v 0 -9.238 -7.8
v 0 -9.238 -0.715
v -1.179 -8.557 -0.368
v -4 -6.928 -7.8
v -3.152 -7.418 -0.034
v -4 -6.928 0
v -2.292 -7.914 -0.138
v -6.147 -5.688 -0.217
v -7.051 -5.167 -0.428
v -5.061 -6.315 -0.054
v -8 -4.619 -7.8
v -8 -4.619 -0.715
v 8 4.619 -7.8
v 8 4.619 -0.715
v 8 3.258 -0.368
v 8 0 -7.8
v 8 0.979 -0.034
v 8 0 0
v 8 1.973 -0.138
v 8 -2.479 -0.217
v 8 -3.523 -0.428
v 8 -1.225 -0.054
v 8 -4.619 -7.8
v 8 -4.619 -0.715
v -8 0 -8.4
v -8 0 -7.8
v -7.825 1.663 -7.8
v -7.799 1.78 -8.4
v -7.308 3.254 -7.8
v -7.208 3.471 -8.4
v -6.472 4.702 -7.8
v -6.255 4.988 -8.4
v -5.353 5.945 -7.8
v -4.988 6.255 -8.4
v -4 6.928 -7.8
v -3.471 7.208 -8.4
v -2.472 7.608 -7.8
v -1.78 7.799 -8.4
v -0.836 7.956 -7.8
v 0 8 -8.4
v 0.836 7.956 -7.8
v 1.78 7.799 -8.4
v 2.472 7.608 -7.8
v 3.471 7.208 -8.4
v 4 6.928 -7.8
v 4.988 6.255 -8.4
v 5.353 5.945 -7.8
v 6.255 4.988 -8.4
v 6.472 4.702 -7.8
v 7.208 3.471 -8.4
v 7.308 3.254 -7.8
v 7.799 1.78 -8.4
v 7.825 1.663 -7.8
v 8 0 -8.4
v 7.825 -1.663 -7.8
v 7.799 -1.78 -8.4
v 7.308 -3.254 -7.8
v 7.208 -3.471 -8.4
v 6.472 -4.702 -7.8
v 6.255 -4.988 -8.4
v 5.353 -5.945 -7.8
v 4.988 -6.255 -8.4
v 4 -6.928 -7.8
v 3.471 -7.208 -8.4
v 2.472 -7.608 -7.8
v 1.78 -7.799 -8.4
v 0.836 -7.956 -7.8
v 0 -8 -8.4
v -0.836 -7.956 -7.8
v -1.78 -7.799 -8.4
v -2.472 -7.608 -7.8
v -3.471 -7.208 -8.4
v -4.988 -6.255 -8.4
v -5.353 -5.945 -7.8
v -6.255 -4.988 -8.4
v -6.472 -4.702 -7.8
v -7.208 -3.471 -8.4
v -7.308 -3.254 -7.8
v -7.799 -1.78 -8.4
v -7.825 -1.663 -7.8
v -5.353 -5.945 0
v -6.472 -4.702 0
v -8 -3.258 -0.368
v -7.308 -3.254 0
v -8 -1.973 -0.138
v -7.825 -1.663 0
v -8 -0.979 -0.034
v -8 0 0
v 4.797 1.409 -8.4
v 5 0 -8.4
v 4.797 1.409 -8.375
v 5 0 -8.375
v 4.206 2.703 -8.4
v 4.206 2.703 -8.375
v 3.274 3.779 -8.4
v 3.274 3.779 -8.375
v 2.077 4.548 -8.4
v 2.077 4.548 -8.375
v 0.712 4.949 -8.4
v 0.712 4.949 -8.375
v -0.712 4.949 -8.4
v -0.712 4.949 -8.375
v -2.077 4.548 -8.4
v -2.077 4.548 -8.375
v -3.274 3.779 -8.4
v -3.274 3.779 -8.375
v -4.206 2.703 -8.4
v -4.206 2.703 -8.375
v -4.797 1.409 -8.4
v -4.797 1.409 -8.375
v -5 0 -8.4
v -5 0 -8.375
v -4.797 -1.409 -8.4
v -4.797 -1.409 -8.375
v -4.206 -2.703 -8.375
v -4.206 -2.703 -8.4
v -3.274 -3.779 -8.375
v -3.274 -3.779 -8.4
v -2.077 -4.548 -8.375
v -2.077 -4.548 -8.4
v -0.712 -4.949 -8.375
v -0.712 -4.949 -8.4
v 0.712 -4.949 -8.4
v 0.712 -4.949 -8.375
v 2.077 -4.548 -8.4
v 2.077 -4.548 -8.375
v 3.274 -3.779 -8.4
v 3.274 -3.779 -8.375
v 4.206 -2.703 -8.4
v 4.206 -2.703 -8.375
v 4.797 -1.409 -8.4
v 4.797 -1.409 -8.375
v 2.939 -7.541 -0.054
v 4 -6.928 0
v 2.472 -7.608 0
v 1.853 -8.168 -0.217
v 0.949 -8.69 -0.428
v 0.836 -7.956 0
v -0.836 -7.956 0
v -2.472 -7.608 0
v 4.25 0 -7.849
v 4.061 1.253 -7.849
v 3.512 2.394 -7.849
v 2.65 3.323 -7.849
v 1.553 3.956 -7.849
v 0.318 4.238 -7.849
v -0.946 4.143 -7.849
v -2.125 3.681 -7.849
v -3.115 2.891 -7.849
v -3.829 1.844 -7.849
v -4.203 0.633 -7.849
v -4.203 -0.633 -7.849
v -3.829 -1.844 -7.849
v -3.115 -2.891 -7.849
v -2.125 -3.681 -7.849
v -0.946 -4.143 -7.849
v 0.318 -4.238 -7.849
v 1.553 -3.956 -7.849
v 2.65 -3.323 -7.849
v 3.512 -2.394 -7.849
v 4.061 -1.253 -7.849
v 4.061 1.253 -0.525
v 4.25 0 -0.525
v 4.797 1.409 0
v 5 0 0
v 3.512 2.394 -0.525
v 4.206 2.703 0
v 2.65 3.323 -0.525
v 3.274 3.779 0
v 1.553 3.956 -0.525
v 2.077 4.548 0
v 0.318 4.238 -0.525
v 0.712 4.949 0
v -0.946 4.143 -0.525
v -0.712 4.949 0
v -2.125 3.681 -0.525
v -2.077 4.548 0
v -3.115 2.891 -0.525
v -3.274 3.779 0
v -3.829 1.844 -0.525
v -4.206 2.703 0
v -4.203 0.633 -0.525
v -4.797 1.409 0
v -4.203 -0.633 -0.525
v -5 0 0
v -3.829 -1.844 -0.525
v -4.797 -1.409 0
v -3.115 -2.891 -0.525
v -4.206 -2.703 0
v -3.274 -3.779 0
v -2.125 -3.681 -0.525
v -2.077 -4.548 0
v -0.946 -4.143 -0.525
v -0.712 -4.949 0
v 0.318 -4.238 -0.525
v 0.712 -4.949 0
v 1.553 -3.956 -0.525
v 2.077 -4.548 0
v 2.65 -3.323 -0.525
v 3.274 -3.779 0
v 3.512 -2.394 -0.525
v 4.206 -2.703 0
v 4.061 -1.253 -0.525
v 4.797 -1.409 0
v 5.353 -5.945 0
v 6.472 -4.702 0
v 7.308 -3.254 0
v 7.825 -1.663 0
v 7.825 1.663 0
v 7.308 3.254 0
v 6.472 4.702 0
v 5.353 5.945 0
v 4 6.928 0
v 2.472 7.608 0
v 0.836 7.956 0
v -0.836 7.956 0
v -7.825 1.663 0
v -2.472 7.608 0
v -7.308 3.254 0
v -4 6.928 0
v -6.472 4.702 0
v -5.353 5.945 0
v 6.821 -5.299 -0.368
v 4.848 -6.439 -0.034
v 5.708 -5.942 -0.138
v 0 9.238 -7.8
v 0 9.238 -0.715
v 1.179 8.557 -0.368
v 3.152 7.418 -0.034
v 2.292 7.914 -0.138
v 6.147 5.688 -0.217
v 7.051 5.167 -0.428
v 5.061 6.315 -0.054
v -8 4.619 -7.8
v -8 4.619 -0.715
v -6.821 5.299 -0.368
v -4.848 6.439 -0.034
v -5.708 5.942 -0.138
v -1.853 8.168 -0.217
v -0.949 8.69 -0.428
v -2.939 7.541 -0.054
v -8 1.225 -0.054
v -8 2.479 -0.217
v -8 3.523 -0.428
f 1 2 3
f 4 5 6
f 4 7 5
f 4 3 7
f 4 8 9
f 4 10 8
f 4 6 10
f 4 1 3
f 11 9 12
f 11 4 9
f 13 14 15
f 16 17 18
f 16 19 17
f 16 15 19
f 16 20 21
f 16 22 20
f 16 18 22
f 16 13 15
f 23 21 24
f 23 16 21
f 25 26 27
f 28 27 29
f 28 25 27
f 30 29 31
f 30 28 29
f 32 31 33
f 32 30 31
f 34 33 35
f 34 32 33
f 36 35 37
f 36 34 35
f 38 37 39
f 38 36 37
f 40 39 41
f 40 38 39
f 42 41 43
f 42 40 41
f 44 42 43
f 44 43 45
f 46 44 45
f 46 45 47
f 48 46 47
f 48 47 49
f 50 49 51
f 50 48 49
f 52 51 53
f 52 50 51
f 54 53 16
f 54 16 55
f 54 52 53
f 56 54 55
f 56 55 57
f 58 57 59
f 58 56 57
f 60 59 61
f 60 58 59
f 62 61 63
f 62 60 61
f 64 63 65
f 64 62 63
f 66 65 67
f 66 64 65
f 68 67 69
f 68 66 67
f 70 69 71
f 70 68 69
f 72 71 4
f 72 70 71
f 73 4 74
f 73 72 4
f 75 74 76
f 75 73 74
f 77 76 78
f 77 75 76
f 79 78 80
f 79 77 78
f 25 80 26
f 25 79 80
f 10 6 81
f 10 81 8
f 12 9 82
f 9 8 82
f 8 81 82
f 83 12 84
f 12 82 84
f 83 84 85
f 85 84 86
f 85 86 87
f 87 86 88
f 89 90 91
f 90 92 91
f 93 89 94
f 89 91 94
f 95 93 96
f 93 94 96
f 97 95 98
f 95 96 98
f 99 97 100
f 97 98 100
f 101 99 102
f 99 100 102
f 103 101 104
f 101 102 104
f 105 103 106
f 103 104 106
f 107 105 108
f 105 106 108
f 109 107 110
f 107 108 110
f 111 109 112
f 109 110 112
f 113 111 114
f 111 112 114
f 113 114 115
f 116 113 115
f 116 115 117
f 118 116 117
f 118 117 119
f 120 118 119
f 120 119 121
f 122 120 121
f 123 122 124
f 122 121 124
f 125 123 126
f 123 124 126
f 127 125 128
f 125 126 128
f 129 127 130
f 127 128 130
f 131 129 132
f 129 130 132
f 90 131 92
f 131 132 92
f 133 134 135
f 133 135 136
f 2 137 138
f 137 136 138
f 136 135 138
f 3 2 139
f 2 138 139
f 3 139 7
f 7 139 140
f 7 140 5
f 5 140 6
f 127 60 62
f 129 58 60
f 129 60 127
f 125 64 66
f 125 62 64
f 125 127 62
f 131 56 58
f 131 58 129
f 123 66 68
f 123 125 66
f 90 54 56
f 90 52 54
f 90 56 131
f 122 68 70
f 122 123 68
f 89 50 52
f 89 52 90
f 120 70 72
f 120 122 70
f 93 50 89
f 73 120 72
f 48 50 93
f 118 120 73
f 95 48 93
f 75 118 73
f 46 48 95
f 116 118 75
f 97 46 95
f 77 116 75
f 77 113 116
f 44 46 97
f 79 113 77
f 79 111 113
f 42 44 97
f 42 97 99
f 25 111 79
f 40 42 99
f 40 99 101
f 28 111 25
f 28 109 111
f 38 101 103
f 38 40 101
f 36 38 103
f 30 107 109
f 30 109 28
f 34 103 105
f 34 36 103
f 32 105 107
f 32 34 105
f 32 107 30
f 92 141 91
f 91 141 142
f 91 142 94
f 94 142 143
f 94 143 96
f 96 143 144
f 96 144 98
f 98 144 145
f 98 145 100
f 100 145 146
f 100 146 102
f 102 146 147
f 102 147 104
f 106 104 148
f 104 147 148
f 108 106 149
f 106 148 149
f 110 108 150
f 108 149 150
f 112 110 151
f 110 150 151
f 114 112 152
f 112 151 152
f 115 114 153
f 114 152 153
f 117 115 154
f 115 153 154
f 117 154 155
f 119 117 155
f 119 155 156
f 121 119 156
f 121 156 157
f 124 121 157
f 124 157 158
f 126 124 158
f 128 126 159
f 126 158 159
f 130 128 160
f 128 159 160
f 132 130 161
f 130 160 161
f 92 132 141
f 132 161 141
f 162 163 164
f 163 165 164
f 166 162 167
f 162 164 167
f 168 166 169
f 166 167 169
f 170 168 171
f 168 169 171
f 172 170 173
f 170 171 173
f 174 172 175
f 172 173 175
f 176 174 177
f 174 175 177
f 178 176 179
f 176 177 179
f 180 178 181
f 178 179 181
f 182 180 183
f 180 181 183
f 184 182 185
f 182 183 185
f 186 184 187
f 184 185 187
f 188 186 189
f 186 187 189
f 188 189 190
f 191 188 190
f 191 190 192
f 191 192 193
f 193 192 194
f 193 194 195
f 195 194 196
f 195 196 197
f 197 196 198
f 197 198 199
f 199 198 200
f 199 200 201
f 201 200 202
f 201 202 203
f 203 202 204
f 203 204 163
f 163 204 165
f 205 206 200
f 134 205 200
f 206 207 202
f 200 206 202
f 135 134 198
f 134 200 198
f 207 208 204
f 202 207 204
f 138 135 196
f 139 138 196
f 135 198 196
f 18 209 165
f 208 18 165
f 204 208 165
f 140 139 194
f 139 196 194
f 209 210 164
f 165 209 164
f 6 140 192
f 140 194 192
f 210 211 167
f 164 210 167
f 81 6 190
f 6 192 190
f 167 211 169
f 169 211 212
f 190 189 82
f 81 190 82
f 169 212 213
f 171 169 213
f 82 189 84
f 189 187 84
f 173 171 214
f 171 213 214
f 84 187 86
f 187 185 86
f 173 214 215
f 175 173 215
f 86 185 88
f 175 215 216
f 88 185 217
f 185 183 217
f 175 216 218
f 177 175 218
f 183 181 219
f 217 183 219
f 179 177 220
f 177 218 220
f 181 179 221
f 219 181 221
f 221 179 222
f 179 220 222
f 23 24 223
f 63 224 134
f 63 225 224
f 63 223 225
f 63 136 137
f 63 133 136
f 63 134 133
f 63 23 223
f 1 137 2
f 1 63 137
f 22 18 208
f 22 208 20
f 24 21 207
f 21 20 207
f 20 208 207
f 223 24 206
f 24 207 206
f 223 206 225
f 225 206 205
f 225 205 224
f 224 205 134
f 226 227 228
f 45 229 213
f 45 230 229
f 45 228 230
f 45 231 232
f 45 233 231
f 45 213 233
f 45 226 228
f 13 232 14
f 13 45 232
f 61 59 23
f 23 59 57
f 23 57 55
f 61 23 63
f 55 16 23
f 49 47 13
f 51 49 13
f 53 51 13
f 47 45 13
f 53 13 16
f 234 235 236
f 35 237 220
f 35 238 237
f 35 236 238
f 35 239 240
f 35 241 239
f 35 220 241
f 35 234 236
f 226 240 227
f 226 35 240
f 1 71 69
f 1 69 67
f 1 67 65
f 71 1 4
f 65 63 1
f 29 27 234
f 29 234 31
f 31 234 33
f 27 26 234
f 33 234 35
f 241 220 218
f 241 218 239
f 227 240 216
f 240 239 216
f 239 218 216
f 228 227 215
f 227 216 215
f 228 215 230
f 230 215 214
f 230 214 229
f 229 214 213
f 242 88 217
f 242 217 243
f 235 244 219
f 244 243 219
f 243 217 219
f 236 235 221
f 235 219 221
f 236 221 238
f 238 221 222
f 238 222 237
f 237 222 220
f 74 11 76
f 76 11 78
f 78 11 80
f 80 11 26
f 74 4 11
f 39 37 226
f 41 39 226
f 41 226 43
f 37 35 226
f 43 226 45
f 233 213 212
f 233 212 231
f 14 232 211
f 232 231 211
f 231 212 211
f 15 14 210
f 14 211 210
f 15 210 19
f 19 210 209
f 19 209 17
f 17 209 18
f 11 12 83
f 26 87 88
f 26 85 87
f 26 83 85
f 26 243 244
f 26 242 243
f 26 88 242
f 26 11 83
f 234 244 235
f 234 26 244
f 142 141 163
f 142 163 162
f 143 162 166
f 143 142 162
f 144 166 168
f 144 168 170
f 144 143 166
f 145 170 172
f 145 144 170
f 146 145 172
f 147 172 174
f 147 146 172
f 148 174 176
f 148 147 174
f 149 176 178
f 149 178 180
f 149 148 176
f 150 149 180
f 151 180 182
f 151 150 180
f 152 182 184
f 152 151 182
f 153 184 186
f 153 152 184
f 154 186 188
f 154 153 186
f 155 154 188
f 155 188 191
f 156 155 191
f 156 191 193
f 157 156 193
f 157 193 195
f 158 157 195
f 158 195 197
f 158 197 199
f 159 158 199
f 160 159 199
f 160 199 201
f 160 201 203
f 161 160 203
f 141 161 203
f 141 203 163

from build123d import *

# Parameters (mm, degrees)
BASENUT_START = -8.4
BASENUTSKE_R  = 4.25
BASENUT_DEPTH = 8.4
SKETCH4_W     = 0.6
SKETCH4_H     = 11.237604307


# Read off the part's stored shape, not the designer's step: ThreadSchematic
with BuildPart() as part:
    # BaseNutSke → BaseNut (new body)
    with BuildSketch(Plane.XY.offset(BASENUT_START)):
        Polygon((8, 4.618802154), (8, -4.618802154), (0, -9.237604307), (-8, -4.618802154), (-8, 4.618802154), (0, 9.237604307), align=None)
        Circle(BASENUTSKE_R, mode=Mode.SUBTRACT)
    extrude(amount=BASENUT_DEPTH)

    # Sketch5 (on Front Plane) → EndChamfer (revolve, cut)
    with BuildSketch(Plane.XY):
        Polygon((8.3746, 5), (7.796928781, 4.175), (8.4254, 4.175), (8.4254, 5), align=None)
    revolve(axis=Axis((8.3746, 5, 0), (-0.5735764363510462, -0.8191520442889919, 0)), mode=Mode.SUBTRACT)

    # Sketch4 → Bearing-Face (revolve, cut)
    with BuildSketch(Plane(origin=(0, 0, 0), x_dir=(0, 0, -1), z_dir=(1, 0, 0)), mode=Mode.PRIVATE) as bearing_face_sk:
        with Locations((8.1, 13.618802154)):
            Rectangle(SKETCH4_W, SKETCH4_H)
        Polygon((0, 8), (-10, 8), (-10, 19.237604307), (0.71453118, 19.237604307), (0.71453118, 9.237604307), align=None)
    revolve(bearing_face_sk.sketch.rotate(Axis((0, 0, 0), (0, 0, -1)), 270), axis=Axis((0, 0, 0), (0, 0, -1)), mode=Mode.SUBTRACT)

    # ThreadSchematic outline → ThreadSchematic (revolve, cut)
    with BuildSketch(Plane.XZ):
        Polygon((4.25, 0), (4.25, -0.525155654), (5, 0), align=None)
        Polygon((5, -8.3746), (4.25, -7.849444346), (4.25, -8.4), (5, -8.4), align=None)
    revolve(axis=Axis((0, 0, 0), (0, 0, 1)), mode=Mode.SUBTRACT)


solid = part.part
